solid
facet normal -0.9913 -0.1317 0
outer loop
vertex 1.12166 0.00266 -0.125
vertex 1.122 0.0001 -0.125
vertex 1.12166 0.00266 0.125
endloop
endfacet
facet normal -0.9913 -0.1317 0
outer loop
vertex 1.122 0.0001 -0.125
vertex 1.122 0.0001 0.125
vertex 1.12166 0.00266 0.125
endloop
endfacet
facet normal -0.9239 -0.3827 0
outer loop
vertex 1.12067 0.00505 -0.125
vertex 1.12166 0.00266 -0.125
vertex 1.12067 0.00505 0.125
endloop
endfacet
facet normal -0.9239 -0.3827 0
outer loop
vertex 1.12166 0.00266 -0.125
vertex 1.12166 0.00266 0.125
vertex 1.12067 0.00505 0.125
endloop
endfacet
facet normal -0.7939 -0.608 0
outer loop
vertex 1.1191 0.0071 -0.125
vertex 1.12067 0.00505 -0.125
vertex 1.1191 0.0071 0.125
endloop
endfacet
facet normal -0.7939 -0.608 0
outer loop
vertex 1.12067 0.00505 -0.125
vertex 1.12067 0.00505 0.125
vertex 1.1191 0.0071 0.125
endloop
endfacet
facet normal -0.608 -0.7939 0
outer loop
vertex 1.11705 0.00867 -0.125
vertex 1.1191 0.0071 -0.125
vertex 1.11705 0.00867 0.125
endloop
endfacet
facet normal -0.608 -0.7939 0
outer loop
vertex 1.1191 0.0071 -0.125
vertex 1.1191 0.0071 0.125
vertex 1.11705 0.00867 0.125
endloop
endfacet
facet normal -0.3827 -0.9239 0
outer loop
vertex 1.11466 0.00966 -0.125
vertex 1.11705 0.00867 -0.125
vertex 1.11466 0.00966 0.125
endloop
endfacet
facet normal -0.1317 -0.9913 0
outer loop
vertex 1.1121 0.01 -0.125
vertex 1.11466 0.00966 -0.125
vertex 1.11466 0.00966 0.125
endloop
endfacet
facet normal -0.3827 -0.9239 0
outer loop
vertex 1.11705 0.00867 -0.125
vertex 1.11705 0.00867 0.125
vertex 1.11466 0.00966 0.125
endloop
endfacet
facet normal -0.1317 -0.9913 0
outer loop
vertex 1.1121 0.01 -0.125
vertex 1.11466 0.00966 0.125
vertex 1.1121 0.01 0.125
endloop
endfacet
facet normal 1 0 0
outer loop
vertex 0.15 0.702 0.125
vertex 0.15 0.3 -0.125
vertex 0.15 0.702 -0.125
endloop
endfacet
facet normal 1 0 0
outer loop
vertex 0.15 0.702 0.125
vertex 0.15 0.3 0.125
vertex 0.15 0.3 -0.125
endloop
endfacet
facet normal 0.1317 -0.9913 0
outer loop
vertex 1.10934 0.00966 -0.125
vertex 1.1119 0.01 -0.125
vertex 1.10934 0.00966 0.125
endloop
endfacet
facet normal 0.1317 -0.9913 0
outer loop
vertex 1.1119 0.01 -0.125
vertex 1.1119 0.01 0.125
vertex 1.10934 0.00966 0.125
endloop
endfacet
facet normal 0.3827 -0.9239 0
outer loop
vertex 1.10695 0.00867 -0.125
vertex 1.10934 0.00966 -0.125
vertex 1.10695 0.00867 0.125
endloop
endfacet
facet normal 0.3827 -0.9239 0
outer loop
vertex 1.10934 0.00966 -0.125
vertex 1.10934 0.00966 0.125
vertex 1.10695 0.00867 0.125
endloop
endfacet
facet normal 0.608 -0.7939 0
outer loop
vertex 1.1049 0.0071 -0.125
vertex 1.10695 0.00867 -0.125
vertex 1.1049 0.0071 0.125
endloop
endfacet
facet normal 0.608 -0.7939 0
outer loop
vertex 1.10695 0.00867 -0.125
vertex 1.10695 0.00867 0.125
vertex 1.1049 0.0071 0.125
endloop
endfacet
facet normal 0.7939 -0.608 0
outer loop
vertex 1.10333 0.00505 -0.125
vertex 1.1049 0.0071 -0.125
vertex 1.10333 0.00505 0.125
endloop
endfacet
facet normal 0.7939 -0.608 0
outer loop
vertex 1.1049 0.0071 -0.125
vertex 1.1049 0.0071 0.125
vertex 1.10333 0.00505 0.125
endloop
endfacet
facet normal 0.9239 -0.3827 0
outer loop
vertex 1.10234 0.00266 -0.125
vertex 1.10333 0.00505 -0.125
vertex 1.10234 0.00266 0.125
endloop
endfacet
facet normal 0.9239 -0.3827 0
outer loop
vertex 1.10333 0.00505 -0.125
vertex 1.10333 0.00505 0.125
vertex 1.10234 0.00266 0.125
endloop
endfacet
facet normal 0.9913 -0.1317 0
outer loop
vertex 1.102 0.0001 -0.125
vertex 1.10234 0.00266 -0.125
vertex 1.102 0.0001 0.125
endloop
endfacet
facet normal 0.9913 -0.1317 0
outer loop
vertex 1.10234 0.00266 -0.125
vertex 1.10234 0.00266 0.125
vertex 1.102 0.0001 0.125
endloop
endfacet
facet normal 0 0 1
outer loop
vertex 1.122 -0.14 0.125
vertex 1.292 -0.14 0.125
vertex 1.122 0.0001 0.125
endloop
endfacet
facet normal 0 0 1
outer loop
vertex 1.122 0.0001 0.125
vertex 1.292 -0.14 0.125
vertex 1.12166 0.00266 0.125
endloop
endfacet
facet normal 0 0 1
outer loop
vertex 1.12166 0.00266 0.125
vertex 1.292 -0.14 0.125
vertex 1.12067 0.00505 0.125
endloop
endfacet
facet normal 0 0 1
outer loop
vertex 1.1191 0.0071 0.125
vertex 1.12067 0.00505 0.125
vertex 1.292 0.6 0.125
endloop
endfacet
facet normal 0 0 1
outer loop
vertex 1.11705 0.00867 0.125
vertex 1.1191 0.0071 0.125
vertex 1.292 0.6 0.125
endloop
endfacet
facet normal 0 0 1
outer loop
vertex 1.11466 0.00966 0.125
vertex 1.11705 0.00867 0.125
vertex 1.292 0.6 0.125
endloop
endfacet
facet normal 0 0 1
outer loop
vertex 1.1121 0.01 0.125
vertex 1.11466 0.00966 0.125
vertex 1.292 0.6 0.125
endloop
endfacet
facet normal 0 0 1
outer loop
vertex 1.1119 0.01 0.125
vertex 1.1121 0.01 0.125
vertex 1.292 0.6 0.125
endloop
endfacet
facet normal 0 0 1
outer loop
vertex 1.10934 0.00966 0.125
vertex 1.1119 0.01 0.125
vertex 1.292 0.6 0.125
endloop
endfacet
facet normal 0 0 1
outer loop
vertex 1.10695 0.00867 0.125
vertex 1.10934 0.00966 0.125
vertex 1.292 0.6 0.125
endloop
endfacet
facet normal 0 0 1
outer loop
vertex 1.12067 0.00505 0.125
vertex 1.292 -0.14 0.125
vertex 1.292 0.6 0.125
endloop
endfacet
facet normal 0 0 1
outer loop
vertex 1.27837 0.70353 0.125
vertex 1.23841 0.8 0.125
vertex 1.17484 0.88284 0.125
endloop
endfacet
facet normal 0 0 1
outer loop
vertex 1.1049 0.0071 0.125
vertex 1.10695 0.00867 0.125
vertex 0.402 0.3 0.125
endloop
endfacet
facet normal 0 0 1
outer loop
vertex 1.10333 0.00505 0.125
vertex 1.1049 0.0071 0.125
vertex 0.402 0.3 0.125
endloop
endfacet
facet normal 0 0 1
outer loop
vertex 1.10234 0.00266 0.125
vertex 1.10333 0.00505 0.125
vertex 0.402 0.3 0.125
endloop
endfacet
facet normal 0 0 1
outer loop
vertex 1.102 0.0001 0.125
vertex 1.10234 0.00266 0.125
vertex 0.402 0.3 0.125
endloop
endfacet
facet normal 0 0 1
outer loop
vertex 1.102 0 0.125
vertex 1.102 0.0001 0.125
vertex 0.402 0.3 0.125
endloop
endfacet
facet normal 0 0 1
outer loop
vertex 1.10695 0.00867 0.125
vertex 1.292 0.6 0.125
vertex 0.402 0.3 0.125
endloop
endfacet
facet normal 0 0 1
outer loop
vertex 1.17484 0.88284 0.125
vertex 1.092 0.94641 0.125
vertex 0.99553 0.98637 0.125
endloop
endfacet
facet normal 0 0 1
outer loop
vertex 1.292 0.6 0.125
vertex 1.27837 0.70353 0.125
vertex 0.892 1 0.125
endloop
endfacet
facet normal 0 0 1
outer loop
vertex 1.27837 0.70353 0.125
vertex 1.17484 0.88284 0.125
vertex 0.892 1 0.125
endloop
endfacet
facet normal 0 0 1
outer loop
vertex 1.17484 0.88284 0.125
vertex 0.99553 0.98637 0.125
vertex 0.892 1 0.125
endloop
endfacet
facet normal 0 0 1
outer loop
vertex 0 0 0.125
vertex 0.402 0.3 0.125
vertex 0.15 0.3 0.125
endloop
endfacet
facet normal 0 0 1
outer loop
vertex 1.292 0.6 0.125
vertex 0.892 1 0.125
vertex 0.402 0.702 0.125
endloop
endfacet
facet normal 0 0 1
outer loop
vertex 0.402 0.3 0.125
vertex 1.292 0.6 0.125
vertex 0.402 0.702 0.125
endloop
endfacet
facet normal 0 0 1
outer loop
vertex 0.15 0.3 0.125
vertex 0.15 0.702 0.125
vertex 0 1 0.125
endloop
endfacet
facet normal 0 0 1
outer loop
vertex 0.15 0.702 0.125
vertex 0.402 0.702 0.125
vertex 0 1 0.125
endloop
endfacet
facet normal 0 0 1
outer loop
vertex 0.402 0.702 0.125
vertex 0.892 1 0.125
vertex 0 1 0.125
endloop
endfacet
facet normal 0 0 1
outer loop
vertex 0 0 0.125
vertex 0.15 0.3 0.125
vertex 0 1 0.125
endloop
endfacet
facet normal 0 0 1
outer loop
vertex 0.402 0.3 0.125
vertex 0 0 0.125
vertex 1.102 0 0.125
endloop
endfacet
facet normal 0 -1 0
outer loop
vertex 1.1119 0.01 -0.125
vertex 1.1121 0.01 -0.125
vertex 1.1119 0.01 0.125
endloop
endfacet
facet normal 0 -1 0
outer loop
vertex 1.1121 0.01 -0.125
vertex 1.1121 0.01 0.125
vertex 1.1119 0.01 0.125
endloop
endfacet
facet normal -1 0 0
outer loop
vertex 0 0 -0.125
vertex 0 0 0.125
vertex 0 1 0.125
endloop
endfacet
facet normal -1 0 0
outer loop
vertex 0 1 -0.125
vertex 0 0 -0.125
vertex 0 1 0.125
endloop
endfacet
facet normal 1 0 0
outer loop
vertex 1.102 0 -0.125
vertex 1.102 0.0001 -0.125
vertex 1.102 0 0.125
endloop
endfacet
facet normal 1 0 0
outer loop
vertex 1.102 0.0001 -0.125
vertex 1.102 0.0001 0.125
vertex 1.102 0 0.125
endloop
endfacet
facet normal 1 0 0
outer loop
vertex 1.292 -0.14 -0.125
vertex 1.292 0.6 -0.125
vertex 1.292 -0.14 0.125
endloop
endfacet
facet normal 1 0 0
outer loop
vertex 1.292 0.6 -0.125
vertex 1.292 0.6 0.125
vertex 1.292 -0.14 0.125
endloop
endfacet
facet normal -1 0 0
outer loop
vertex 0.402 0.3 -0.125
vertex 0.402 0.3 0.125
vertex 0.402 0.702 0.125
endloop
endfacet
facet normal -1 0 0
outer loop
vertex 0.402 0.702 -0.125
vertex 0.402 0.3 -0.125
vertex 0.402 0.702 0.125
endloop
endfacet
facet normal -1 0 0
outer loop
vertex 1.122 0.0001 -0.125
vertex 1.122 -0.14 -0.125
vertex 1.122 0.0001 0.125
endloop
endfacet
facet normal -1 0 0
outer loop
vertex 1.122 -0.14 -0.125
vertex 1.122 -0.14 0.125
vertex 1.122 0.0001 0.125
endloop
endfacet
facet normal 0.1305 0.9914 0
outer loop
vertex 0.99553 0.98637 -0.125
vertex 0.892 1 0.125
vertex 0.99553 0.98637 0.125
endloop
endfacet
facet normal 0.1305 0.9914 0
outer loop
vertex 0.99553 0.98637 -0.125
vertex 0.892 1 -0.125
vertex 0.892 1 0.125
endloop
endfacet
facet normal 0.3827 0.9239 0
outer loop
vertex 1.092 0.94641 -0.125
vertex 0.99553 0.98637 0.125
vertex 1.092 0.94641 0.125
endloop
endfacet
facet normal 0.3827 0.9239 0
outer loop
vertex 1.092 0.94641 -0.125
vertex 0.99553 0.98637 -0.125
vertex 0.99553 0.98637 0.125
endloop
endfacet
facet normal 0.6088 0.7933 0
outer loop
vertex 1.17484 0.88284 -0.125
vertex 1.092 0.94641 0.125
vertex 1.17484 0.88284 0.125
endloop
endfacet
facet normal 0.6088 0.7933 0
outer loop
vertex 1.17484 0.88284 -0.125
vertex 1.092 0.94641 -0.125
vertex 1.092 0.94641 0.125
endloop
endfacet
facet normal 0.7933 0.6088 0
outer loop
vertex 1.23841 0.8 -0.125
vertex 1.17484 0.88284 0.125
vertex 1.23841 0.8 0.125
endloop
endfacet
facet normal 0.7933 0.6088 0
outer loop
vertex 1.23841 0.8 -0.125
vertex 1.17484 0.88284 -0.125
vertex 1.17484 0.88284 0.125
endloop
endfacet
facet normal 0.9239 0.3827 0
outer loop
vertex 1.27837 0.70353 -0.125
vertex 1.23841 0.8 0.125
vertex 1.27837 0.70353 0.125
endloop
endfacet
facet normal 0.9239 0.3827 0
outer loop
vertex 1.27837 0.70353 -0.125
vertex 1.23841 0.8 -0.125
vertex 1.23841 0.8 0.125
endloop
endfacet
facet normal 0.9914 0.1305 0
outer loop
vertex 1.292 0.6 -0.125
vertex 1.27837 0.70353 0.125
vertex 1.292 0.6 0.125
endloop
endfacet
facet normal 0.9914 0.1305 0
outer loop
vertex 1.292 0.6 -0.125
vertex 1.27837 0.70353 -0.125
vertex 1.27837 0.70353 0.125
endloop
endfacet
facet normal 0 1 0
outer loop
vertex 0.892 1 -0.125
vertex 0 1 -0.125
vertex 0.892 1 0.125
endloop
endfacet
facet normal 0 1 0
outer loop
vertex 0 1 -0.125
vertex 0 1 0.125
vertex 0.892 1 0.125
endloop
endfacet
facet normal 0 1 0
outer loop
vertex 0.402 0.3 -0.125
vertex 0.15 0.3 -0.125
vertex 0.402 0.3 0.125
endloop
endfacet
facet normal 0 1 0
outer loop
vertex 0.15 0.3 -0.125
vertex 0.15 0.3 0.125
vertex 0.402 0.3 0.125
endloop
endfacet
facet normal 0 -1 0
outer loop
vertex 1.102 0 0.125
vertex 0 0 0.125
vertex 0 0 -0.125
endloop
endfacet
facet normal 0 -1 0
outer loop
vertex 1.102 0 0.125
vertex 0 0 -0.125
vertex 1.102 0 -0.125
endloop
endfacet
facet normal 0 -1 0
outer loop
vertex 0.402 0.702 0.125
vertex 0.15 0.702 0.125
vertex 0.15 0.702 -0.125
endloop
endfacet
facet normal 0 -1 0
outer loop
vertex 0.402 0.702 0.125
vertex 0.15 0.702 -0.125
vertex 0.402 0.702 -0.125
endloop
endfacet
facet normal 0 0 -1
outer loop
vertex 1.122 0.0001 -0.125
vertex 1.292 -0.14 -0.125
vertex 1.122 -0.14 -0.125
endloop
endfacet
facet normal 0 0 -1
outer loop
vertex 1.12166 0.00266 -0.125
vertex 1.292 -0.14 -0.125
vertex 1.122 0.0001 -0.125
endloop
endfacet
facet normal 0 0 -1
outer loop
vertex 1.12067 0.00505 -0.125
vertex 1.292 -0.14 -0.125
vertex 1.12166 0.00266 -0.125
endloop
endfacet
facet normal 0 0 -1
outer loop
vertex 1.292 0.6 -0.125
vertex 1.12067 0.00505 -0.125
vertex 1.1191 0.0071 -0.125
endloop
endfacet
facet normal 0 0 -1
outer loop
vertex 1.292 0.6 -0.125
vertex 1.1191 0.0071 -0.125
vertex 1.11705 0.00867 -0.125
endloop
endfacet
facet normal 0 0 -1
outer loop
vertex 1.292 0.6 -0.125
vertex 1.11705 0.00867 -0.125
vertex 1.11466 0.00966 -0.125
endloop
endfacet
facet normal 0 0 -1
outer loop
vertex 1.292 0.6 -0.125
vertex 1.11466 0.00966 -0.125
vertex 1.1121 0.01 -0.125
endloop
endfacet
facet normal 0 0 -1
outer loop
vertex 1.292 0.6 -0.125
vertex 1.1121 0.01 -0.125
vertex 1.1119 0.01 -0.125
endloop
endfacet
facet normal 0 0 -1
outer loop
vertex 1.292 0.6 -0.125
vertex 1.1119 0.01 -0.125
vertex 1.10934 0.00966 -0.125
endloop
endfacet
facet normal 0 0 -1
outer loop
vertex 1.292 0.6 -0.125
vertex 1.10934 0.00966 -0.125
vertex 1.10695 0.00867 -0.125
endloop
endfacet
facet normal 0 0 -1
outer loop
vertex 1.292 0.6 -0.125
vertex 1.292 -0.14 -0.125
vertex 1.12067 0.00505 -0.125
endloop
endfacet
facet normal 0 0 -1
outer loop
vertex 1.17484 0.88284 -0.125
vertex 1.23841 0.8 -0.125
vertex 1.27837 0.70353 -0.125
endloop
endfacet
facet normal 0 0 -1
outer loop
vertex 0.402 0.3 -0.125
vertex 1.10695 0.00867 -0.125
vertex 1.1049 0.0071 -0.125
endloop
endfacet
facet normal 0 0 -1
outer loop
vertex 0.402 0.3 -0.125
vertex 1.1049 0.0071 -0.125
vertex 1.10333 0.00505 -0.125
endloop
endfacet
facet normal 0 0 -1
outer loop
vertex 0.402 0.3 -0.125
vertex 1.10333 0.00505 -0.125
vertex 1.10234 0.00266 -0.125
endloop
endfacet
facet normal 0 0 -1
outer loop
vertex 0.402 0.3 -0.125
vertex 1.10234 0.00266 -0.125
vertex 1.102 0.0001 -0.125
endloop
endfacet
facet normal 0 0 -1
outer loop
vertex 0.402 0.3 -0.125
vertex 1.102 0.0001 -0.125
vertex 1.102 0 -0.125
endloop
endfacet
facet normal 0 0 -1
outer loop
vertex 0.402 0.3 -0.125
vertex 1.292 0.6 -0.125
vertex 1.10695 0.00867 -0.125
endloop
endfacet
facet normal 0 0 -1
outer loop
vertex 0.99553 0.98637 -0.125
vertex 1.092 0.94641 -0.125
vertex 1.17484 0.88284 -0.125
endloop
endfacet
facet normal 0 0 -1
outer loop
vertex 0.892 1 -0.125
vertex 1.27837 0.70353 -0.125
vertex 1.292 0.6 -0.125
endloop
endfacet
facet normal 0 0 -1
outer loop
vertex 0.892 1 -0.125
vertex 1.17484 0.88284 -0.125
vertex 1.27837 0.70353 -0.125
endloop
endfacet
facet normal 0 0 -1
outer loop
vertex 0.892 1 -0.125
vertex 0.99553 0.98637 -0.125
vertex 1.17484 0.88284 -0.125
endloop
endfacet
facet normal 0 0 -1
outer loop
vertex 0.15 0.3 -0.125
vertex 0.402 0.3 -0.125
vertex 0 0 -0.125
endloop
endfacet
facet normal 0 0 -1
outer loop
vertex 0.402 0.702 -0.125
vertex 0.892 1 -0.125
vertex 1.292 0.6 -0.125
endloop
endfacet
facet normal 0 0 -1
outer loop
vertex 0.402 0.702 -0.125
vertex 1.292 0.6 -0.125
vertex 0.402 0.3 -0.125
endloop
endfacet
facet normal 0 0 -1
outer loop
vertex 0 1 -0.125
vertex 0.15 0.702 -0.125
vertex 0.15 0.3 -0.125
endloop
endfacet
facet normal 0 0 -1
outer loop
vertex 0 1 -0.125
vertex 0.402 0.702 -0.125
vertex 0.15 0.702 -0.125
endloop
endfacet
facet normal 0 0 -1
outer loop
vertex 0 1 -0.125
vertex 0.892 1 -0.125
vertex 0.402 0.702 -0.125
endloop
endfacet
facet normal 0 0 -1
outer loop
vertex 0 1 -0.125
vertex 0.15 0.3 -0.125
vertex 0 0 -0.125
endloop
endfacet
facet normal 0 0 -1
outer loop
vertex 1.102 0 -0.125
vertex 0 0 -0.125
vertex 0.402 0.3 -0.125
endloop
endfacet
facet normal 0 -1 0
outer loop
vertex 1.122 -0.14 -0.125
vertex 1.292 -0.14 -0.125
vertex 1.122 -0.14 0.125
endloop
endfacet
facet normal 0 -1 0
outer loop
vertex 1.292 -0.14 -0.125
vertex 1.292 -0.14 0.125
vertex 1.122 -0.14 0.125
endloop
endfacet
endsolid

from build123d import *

# Parameters (mm, degrees)
FRAME_OUTLINE_W     = 0.252
FRAME_OUTLINE_H     = 0.402
BOSS_EXTRUDE1_DEPTH = 0.125
FILLET1_R           = 0.01
FILLET2_R           = 0.4


with BuildPart() as part:
    # frame_outline → Boss-Extrude1 (new, symmetric)
    with BuildSketch(Plane.XY):
        Polygon((0, 0), (0, 1), (1.292, 1), (1.292, -0.14), (1.122, -0.14), (1.122, 0.01), (1.102, 0.01), (1.102, 0), (0.302, 0), align=None)
        with Locations((0.276, 0.501)):
            Rectangle(FRAME_OUTLINE_W, FRAME_OUTLINE_H, mode=Mode.SUBTRACT)
    extrude(amount=BOSS_EXTRUDE1_DEPTH, both=True)

    # Fillet1
    fillet1_edges = [part.edges().sort_by_distance(p)[0] for p in [
        (1.122, 0.01, 0),
        (1.102, 0.01, 0),
    ]]
    fillet(fillet1_edges, radius=FILLET1_R - 0.0001)  # a hair under: the kernel refuses the full size

    # Fillet2
    fillet2_edges = [part.edges().sort_by_distance(p)[0] for p in [
        (1.292, 1, 0),
    ]]
    fillet(fillet2_edges, radius=FILLET2_R)


solid = part.part
